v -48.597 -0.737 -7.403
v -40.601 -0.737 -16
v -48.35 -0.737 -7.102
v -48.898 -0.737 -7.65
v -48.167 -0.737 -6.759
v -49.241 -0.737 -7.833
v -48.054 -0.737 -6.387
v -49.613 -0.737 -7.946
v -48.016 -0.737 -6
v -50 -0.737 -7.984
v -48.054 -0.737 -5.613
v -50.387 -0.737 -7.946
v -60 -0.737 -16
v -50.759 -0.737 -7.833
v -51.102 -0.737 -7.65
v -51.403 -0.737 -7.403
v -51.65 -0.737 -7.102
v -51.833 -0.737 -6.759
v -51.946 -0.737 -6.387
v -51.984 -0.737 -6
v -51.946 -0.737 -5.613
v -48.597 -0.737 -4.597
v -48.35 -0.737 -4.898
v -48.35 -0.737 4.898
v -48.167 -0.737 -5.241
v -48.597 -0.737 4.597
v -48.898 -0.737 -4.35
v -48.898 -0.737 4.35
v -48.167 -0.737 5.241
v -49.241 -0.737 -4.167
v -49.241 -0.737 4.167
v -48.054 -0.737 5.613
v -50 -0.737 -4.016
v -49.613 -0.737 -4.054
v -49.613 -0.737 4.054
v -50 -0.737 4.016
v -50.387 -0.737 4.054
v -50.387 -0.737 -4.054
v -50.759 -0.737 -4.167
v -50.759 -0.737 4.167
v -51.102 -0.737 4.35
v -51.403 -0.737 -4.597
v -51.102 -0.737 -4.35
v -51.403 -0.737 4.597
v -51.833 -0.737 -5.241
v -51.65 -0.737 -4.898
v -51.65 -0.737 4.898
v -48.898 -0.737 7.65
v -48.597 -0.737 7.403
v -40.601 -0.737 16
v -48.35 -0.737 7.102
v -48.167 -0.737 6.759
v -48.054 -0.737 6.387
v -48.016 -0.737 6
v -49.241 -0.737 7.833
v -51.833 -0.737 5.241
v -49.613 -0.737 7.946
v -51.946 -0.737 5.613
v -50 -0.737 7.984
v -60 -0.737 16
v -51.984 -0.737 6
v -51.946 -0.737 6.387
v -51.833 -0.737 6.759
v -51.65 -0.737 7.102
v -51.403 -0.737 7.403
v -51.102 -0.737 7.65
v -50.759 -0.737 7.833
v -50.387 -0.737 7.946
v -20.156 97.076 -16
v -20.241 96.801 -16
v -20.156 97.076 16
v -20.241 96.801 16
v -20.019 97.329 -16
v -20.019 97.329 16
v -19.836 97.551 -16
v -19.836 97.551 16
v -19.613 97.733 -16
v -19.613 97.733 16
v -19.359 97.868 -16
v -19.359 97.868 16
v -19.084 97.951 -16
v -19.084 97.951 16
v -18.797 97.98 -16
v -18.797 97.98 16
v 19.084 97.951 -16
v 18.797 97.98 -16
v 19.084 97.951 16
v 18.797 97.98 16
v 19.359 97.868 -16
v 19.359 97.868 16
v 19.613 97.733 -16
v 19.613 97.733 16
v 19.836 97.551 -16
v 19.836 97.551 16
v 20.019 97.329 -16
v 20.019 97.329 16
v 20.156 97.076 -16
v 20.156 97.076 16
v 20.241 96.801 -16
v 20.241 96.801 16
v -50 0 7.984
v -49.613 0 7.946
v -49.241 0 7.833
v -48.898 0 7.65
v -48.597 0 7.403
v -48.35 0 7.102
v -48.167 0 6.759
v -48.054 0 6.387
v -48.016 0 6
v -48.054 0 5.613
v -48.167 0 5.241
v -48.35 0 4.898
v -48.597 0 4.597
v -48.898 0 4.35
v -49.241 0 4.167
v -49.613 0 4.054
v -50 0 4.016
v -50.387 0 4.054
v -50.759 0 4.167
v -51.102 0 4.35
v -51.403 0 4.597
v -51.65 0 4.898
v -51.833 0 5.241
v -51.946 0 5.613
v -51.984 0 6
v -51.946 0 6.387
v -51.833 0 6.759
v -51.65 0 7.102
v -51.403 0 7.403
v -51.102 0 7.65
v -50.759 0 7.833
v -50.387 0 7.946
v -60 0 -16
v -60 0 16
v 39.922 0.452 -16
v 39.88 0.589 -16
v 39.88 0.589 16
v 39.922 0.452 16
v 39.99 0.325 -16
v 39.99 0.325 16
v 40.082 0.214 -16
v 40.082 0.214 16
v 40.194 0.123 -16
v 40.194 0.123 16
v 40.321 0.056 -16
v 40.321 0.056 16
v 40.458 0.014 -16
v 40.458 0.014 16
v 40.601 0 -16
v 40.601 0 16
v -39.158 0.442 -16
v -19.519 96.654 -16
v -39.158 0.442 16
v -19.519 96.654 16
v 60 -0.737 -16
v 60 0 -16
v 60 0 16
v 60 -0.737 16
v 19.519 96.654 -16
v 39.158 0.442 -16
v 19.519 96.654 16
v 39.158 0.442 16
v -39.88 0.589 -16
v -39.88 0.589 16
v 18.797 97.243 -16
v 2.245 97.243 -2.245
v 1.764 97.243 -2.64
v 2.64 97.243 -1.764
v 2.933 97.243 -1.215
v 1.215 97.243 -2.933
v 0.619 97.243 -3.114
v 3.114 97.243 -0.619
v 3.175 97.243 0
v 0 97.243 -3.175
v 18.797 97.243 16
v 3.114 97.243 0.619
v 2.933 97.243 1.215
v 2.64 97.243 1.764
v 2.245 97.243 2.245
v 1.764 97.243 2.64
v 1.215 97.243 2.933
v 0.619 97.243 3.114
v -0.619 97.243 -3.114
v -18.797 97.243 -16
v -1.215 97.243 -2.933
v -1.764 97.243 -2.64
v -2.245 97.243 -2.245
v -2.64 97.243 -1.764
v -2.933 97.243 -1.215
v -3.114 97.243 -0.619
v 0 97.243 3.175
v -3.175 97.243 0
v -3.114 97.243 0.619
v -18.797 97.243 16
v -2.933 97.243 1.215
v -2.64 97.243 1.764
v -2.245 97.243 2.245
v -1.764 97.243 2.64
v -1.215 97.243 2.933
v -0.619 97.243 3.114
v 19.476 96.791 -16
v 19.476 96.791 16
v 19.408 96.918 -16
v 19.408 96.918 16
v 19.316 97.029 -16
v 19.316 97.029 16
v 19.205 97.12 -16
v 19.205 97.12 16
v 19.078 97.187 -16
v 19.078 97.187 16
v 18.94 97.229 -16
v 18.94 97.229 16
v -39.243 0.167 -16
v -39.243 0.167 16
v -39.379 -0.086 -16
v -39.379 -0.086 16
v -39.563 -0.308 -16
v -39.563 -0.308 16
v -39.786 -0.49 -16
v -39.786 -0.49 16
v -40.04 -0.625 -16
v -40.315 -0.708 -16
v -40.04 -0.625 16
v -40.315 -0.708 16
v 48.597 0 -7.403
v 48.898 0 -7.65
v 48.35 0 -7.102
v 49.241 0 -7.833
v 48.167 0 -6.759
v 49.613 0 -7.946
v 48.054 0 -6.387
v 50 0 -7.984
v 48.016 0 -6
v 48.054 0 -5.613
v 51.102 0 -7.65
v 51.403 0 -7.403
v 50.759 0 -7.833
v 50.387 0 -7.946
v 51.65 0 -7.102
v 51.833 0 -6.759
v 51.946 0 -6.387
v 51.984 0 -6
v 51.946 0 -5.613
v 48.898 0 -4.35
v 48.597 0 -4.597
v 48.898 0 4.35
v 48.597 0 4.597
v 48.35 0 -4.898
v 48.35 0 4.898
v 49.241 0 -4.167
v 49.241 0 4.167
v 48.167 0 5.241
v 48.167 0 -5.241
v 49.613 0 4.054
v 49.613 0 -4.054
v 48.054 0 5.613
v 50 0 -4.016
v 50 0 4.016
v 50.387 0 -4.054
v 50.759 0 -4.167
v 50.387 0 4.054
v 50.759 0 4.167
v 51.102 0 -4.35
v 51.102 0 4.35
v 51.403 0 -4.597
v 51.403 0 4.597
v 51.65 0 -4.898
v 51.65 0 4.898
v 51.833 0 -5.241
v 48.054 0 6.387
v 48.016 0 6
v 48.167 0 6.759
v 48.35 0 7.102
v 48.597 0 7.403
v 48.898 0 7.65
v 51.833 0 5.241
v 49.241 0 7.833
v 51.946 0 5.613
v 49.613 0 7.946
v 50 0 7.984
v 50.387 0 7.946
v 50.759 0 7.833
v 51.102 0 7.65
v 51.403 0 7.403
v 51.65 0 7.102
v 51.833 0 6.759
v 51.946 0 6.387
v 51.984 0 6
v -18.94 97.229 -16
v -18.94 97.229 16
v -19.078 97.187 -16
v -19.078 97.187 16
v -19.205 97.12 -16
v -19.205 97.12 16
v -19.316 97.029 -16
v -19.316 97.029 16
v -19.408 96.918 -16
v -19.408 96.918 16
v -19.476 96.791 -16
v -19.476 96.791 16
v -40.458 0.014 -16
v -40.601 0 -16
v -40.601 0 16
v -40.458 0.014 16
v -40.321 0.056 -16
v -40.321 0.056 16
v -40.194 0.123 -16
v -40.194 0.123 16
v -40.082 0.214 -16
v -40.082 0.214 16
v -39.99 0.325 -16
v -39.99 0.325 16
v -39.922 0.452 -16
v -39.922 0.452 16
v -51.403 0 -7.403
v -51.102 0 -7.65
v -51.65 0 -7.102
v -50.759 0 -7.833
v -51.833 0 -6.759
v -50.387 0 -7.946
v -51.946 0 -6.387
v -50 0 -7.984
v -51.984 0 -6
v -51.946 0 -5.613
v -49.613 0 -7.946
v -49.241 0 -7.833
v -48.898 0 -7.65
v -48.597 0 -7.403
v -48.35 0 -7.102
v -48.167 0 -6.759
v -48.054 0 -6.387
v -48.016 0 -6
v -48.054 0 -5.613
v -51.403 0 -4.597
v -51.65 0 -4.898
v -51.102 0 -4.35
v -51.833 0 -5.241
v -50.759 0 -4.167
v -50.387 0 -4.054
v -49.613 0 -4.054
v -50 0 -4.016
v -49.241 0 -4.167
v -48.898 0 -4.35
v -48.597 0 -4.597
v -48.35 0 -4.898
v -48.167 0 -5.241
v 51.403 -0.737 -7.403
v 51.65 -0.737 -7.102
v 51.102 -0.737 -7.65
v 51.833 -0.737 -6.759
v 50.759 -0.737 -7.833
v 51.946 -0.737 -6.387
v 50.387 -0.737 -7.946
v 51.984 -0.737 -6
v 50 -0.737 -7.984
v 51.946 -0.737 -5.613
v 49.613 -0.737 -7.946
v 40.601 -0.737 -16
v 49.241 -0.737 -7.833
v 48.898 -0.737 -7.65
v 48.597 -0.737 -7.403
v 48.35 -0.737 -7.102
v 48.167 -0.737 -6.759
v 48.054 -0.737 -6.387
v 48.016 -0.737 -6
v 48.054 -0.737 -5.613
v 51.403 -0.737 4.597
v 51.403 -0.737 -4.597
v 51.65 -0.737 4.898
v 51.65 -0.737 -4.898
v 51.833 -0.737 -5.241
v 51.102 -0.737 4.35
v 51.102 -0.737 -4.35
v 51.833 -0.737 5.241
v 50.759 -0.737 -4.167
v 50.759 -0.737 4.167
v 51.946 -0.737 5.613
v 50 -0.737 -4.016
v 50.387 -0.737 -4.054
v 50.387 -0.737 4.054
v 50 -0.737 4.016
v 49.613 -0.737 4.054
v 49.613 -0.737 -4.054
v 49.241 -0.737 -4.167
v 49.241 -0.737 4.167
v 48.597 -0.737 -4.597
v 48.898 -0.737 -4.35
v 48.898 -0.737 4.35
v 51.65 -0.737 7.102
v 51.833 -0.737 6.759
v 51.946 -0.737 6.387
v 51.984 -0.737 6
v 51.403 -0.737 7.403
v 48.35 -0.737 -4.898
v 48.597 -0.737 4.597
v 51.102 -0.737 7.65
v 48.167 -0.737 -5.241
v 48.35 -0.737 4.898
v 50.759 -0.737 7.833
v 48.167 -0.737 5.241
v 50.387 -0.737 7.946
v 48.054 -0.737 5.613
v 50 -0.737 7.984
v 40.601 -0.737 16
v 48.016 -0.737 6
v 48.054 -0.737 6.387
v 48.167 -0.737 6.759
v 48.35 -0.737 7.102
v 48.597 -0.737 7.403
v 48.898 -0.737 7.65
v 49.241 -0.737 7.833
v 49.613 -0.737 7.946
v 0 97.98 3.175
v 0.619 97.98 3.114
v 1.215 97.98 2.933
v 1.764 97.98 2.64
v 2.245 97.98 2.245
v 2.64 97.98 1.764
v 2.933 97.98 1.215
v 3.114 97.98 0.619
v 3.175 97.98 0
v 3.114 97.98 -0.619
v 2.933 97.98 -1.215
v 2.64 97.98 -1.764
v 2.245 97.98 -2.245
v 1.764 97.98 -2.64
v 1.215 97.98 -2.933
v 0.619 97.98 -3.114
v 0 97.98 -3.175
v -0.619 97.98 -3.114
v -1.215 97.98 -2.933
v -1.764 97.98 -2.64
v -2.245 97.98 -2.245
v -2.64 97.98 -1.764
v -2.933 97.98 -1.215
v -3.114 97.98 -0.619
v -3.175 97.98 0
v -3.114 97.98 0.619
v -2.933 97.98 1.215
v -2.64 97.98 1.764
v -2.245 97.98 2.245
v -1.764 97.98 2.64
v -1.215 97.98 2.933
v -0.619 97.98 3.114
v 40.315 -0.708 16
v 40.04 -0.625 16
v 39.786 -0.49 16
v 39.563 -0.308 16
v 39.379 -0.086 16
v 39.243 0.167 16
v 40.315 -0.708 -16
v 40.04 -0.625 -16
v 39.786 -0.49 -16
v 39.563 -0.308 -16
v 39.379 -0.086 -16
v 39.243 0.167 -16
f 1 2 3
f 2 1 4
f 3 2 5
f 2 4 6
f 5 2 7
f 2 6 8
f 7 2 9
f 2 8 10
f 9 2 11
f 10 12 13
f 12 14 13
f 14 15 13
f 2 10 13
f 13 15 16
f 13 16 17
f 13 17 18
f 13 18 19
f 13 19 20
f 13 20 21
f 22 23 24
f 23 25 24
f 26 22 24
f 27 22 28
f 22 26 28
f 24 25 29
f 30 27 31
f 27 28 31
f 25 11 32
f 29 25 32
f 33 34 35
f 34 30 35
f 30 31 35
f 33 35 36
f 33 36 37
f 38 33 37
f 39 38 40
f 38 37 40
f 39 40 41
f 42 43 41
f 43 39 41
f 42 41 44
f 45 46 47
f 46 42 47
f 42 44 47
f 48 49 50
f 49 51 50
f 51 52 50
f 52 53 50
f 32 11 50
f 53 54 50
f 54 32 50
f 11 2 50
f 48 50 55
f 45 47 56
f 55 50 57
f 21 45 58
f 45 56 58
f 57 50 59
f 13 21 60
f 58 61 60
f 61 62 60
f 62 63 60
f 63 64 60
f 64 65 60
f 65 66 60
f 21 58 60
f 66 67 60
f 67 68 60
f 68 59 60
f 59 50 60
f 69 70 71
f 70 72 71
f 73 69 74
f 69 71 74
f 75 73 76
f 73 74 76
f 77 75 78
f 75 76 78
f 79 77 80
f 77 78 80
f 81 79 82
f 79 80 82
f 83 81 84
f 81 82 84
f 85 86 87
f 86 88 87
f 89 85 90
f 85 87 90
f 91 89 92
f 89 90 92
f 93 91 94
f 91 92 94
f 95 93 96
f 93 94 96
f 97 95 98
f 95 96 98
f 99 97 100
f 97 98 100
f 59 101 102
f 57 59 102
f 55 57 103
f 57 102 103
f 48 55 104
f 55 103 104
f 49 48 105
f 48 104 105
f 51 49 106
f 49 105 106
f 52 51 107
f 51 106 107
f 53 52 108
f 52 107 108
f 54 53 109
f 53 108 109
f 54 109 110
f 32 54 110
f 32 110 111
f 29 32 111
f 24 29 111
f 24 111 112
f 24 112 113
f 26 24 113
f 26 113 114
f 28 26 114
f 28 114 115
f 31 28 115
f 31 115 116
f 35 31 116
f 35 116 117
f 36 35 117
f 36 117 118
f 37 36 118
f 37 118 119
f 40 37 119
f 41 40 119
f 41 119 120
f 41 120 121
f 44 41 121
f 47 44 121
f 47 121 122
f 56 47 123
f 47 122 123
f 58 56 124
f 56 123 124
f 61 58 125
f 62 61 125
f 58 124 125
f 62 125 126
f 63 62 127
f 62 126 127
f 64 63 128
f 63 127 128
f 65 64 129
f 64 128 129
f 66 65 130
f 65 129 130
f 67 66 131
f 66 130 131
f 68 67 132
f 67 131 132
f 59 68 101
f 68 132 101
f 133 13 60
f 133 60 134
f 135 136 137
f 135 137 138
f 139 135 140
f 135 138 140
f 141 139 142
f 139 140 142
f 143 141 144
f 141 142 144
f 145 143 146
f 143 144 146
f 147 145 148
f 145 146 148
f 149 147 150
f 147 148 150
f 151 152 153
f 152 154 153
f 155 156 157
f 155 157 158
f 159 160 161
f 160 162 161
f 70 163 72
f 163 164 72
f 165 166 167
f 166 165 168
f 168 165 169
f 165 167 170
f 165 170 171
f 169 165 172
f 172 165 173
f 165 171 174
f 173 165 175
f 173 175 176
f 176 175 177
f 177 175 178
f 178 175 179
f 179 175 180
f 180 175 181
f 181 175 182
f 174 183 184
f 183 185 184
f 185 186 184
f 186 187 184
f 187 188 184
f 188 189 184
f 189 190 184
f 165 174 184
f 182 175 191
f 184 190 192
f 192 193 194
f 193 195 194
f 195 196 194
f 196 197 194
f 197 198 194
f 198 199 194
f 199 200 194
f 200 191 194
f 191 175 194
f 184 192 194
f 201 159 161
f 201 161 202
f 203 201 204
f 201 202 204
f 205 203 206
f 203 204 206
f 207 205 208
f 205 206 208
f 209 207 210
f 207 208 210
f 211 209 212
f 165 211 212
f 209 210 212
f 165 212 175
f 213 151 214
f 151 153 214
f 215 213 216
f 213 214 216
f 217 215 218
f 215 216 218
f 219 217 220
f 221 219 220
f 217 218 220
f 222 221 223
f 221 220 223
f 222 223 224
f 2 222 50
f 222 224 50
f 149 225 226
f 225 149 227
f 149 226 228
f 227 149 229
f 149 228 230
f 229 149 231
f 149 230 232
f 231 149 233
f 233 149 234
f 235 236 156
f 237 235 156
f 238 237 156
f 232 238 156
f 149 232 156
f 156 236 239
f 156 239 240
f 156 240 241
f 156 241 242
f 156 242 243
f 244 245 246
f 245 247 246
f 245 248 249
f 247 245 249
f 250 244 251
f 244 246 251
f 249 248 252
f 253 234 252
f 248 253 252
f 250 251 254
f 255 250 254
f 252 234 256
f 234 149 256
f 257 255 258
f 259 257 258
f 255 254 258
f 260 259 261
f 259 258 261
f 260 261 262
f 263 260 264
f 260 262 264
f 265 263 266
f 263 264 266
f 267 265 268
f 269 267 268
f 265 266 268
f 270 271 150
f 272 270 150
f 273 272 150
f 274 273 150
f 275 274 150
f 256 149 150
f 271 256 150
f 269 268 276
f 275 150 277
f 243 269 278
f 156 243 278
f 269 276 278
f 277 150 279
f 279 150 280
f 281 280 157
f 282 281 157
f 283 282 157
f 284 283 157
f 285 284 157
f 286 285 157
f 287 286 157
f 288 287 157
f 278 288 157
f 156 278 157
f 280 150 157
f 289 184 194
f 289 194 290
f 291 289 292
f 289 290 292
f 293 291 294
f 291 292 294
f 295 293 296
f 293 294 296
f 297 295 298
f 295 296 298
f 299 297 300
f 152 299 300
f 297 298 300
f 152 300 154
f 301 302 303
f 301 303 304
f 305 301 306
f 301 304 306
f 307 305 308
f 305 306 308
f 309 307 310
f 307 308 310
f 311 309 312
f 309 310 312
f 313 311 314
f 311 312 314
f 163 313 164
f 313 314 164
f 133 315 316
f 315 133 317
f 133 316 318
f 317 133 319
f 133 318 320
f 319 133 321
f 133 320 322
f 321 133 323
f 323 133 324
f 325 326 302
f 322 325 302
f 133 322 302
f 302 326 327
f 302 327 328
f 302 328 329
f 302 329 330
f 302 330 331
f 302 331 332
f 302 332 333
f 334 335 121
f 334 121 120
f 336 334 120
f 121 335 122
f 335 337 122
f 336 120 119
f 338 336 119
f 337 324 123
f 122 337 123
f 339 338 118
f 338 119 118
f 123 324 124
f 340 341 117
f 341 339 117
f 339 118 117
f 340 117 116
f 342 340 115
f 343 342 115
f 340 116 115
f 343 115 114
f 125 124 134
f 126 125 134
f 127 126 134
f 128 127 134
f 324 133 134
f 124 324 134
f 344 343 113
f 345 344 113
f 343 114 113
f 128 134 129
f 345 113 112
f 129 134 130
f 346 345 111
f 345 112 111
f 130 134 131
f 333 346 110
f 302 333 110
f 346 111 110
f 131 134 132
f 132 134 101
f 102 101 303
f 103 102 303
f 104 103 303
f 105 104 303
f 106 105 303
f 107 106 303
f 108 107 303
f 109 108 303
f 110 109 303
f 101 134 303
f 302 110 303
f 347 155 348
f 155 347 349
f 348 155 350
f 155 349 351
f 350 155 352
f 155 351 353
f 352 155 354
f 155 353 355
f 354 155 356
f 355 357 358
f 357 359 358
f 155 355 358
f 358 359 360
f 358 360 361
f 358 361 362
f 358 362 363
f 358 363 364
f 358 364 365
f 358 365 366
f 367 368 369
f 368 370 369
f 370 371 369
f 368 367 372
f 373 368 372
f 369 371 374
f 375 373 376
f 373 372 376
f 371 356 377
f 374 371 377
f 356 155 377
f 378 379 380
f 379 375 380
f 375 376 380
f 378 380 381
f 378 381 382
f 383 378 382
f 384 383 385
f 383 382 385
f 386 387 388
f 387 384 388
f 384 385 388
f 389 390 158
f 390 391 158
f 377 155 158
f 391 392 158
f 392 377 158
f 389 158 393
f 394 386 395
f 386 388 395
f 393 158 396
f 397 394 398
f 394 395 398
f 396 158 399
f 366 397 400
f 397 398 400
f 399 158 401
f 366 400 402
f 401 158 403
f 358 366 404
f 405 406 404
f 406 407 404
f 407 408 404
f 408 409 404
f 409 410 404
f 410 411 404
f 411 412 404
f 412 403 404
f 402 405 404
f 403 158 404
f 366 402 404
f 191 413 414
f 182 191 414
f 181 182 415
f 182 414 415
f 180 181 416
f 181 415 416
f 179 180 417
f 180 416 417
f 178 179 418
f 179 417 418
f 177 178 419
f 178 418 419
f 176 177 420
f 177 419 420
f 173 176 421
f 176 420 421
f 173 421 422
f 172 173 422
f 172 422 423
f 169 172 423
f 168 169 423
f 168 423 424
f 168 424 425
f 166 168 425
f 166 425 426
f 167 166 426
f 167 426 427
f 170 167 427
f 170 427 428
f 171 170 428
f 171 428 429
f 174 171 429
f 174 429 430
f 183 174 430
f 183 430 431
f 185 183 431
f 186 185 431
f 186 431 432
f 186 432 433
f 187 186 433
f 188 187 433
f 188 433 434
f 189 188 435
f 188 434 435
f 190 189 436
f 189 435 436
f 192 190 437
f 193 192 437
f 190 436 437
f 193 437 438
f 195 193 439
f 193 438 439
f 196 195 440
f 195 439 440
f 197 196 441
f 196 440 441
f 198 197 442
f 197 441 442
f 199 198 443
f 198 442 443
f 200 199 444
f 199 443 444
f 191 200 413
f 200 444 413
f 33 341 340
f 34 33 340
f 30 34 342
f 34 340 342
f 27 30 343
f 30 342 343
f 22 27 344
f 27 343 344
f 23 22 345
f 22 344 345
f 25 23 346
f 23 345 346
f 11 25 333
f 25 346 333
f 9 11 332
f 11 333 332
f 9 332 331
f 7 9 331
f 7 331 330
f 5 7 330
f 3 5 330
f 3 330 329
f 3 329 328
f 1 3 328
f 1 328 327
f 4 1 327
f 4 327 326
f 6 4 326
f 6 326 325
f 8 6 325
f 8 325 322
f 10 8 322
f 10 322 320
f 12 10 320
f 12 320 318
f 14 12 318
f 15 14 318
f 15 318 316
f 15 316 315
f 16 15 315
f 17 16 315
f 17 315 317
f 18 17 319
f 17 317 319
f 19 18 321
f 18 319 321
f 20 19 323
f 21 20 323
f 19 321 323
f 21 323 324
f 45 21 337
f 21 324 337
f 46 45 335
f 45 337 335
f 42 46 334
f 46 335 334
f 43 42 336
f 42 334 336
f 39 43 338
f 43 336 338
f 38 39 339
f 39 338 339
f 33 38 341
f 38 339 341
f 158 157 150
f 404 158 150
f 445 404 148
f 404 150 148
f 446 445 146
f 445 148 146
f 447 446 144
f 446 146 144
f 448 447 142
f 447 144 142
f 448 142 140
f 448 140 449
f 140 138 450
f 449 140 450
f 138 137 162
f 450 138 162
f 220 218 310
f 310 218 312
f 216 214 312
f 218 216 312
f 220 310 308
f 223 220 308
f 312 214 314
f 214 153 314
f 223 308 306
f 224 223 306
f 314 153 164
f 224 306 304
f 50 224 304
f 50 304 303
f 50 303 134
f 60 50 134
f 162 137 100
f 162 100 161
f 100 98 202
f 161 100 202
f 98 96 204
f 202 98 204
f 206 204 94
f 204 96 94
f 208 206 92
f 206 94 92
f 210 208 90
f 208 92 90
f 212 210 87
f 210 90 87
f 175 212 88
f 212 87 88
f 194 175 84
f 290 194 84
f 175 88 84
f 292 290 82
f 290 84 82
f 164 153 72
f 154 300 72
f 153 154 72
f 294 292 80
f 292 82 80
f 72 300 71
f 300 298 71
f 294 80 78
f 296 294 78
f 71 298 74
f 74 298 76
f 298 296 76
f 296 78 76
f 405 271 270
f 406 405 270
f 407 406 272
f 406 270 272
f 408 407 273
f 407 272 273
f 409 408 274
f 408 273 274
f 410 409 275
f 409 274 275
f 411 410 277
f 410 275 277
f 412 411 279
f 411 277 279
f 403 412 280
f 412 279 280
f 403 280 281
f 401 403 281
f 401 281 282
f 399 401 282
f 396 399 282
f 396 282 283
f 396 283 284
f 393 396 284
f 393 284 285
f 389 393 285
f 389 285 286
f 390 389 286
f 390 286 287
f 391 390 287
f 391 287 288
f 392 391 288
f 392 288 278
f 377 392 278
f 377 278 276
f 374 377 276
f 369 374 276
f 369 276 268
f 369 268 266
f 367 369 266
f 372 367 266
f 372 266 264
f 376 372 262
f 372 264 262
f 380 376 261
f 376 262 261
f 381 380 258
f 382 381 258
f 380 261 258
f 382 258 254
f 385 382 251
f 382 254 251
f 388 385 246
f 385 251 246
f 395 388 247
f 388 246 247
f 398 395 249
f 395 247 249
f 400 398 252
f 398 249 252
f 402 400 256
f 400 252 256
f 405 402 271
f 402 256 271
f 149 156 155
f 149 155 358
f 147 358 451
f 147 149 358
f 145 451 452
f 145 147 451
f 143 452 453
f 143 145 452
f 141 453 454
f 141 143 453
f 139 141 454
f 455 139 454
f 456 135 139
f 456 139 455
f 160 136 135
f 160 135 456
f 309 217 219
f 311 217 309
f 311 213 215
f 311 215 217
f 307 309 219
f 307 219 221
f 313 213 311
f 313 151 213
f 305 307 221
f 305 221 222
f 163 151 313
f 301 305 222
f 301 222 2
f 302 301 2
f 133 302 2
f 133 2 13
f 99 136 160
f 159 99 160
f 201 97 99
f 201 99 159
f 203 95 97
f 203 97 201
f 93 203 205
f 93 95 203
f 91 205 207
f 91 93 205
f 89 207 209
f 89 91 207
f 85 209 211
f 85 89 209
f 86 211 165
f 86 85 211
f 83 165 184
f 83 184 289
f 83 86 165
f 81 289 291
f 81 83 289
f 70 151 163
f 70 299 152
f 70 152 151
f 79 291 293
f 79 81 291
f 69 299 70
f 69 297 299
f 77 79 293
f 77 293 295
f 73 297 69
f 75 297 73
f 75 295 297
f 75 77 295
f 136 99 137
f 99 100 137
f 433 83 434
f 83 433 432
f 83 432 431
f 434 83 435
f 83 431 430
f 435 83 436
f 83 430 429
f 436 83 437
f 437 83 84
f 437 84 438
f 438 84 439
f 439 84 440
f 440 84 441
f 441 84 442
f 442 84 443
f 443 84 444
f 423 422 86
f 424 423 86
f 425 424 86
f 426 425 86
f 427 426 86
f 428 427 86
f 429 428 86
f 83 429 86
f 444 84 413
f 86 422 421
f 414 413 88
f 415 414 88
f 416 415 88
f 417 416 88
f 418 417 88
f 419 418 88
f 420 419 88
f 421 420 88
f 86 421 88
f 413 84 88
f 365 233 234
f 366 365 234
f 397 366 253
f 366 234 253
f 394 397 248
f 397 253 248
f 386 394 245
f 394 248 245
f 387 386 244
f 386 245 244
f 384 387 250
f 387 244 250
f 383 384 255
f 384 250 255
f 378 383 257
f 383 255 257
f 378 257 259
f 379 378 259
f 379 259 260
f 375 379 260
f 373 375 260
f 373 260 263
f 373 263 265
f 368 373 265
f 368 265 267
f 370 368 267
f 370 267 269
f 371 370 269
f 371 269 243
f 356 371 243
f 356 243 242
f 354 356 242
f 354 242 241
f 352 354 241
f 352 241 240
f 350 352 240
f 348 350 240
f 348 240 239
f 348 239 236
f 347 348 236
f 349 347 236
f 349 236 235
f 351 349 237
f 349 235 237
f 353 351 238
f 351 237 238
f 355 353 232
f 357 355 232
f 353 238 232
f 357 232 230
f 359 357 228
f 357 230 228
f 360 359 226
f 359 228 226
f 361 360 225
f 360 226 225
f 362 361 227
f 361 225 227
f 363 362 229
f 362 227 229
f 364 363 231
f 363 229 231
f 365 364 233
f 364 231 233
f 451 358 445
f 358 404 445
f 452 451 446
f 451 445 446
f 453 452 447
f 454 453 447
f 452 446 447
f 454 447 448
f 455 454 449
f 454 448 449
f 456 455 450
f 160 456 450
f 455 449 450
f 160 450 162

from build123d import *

# Parameters (mm, degrees)
BASE_FLANGE1_DEPTH = 16
SKETCH6_R          = 1.984375
SKETCH6_R_2        = 3.175
CUT_EXTRUDE1_DEPTH = 117.622837005


# Sheet-metal steps are written as plain solids
with BuildPart() as part:
    # Sketch1 → Base-Flange1 (new, symmetric)
    with BuildSketch(Plane.XY):
        with BuildLine():
            Line((-60, 0), (-40.601431382, 0))
            ThreePointArc((-40.601431382, 0), (-40.135564637, 0.166032093), (-39.879713724, 0.58928))
            Line((-39.879713724, 0.58928), (-20.240572553, 96.801029711))
            ThreePointArc((-20.240572553, 96.801029711), (-19.728870727, 97.647525524), (-18.797137237, 97.979589711))
            Line((-18.797137237, 97.979589711), (18.797137237, 97.979589711))
            ThreePointArc((18.797137237, 97.979589711), (19.728870727, 97.647525524), (20.240572553, 96.801029711))
            Line((20.240572553, 96.801029711), (39.879713724, 0.58928))
            ThreePointArc((39.879713724, 0.58928), (40.135564637, 0.166032093), (40.601431382, 0))
            Line((40.601431382, 0), (60, 0))
            Line((60, 0), (60, -0.7366))
            Line((60, -0.7366), (40.601431382, -0.7366))
            ThreePointArc((40.601431382, -0.7366), (39.669697892, -0.404535813), (39.157996066, 0.44196))
            Line((39.157996066, 0.44196), (19.518854895, 96.653709711))
            ThreePointArc((19.518854895, 96.653709711), (19.263003982, 97.076957618), (18.797137237, 97.242989711))
            Line((18.797137237, 97.242989711), (-18.797137237, 97.242989711))
            ThreePointArc((-18.797137237, 97.242989711), (-19.263003982, 97.076957618), (-19.518854895, 96.653709711))
            Line((-19.518854895, 96.653709711), (-39.157996066, 0.44196))
            ThreePointArc((-39.157996066, 0.44196), (-39.669697892, -0.404535813), (-40.601431382, -0.7366))
            Line((-40.601431382, -0.7366), (-60, -0.7366))
            Line((-60, -0.7366), (-60, 0))
        make_face()
    extrude(amount=BASE_FLANGE1_DEPTH, both=True)

    # Sketch6 → Cut-Extrude1 (cut, through all)
    with BuildSketch(Plane(origin=(0, 97.979589711, 0), x_dir=(1, 0, 0), z_dir=(0, 1, 0))):
        with Locations(Location((-50, 6, 0), (0, 0, 270))):
            Circle(SKETCH6_R)
        with Locations(Location((-50, -6, 0), (0, 0, 270))):
            Circle(SKETCH6_R)
        with Locations(Location((0, 0, 0), (0, 0, 270))):
            Circle(SKETCH6_R_2)
        with Locations(Location((50, -6, 0), (0, 0, 180))):
            Circle(SKETCH6_R)
        with Locations(Location((50, 6, 0), (0, 0, 180))):
            Circle(SKETCH6_R)
    extrude(amount=-CUT_EXTRUDE1_DEPTH, mode=Mode.SUBTRACT)


solid = part.part
